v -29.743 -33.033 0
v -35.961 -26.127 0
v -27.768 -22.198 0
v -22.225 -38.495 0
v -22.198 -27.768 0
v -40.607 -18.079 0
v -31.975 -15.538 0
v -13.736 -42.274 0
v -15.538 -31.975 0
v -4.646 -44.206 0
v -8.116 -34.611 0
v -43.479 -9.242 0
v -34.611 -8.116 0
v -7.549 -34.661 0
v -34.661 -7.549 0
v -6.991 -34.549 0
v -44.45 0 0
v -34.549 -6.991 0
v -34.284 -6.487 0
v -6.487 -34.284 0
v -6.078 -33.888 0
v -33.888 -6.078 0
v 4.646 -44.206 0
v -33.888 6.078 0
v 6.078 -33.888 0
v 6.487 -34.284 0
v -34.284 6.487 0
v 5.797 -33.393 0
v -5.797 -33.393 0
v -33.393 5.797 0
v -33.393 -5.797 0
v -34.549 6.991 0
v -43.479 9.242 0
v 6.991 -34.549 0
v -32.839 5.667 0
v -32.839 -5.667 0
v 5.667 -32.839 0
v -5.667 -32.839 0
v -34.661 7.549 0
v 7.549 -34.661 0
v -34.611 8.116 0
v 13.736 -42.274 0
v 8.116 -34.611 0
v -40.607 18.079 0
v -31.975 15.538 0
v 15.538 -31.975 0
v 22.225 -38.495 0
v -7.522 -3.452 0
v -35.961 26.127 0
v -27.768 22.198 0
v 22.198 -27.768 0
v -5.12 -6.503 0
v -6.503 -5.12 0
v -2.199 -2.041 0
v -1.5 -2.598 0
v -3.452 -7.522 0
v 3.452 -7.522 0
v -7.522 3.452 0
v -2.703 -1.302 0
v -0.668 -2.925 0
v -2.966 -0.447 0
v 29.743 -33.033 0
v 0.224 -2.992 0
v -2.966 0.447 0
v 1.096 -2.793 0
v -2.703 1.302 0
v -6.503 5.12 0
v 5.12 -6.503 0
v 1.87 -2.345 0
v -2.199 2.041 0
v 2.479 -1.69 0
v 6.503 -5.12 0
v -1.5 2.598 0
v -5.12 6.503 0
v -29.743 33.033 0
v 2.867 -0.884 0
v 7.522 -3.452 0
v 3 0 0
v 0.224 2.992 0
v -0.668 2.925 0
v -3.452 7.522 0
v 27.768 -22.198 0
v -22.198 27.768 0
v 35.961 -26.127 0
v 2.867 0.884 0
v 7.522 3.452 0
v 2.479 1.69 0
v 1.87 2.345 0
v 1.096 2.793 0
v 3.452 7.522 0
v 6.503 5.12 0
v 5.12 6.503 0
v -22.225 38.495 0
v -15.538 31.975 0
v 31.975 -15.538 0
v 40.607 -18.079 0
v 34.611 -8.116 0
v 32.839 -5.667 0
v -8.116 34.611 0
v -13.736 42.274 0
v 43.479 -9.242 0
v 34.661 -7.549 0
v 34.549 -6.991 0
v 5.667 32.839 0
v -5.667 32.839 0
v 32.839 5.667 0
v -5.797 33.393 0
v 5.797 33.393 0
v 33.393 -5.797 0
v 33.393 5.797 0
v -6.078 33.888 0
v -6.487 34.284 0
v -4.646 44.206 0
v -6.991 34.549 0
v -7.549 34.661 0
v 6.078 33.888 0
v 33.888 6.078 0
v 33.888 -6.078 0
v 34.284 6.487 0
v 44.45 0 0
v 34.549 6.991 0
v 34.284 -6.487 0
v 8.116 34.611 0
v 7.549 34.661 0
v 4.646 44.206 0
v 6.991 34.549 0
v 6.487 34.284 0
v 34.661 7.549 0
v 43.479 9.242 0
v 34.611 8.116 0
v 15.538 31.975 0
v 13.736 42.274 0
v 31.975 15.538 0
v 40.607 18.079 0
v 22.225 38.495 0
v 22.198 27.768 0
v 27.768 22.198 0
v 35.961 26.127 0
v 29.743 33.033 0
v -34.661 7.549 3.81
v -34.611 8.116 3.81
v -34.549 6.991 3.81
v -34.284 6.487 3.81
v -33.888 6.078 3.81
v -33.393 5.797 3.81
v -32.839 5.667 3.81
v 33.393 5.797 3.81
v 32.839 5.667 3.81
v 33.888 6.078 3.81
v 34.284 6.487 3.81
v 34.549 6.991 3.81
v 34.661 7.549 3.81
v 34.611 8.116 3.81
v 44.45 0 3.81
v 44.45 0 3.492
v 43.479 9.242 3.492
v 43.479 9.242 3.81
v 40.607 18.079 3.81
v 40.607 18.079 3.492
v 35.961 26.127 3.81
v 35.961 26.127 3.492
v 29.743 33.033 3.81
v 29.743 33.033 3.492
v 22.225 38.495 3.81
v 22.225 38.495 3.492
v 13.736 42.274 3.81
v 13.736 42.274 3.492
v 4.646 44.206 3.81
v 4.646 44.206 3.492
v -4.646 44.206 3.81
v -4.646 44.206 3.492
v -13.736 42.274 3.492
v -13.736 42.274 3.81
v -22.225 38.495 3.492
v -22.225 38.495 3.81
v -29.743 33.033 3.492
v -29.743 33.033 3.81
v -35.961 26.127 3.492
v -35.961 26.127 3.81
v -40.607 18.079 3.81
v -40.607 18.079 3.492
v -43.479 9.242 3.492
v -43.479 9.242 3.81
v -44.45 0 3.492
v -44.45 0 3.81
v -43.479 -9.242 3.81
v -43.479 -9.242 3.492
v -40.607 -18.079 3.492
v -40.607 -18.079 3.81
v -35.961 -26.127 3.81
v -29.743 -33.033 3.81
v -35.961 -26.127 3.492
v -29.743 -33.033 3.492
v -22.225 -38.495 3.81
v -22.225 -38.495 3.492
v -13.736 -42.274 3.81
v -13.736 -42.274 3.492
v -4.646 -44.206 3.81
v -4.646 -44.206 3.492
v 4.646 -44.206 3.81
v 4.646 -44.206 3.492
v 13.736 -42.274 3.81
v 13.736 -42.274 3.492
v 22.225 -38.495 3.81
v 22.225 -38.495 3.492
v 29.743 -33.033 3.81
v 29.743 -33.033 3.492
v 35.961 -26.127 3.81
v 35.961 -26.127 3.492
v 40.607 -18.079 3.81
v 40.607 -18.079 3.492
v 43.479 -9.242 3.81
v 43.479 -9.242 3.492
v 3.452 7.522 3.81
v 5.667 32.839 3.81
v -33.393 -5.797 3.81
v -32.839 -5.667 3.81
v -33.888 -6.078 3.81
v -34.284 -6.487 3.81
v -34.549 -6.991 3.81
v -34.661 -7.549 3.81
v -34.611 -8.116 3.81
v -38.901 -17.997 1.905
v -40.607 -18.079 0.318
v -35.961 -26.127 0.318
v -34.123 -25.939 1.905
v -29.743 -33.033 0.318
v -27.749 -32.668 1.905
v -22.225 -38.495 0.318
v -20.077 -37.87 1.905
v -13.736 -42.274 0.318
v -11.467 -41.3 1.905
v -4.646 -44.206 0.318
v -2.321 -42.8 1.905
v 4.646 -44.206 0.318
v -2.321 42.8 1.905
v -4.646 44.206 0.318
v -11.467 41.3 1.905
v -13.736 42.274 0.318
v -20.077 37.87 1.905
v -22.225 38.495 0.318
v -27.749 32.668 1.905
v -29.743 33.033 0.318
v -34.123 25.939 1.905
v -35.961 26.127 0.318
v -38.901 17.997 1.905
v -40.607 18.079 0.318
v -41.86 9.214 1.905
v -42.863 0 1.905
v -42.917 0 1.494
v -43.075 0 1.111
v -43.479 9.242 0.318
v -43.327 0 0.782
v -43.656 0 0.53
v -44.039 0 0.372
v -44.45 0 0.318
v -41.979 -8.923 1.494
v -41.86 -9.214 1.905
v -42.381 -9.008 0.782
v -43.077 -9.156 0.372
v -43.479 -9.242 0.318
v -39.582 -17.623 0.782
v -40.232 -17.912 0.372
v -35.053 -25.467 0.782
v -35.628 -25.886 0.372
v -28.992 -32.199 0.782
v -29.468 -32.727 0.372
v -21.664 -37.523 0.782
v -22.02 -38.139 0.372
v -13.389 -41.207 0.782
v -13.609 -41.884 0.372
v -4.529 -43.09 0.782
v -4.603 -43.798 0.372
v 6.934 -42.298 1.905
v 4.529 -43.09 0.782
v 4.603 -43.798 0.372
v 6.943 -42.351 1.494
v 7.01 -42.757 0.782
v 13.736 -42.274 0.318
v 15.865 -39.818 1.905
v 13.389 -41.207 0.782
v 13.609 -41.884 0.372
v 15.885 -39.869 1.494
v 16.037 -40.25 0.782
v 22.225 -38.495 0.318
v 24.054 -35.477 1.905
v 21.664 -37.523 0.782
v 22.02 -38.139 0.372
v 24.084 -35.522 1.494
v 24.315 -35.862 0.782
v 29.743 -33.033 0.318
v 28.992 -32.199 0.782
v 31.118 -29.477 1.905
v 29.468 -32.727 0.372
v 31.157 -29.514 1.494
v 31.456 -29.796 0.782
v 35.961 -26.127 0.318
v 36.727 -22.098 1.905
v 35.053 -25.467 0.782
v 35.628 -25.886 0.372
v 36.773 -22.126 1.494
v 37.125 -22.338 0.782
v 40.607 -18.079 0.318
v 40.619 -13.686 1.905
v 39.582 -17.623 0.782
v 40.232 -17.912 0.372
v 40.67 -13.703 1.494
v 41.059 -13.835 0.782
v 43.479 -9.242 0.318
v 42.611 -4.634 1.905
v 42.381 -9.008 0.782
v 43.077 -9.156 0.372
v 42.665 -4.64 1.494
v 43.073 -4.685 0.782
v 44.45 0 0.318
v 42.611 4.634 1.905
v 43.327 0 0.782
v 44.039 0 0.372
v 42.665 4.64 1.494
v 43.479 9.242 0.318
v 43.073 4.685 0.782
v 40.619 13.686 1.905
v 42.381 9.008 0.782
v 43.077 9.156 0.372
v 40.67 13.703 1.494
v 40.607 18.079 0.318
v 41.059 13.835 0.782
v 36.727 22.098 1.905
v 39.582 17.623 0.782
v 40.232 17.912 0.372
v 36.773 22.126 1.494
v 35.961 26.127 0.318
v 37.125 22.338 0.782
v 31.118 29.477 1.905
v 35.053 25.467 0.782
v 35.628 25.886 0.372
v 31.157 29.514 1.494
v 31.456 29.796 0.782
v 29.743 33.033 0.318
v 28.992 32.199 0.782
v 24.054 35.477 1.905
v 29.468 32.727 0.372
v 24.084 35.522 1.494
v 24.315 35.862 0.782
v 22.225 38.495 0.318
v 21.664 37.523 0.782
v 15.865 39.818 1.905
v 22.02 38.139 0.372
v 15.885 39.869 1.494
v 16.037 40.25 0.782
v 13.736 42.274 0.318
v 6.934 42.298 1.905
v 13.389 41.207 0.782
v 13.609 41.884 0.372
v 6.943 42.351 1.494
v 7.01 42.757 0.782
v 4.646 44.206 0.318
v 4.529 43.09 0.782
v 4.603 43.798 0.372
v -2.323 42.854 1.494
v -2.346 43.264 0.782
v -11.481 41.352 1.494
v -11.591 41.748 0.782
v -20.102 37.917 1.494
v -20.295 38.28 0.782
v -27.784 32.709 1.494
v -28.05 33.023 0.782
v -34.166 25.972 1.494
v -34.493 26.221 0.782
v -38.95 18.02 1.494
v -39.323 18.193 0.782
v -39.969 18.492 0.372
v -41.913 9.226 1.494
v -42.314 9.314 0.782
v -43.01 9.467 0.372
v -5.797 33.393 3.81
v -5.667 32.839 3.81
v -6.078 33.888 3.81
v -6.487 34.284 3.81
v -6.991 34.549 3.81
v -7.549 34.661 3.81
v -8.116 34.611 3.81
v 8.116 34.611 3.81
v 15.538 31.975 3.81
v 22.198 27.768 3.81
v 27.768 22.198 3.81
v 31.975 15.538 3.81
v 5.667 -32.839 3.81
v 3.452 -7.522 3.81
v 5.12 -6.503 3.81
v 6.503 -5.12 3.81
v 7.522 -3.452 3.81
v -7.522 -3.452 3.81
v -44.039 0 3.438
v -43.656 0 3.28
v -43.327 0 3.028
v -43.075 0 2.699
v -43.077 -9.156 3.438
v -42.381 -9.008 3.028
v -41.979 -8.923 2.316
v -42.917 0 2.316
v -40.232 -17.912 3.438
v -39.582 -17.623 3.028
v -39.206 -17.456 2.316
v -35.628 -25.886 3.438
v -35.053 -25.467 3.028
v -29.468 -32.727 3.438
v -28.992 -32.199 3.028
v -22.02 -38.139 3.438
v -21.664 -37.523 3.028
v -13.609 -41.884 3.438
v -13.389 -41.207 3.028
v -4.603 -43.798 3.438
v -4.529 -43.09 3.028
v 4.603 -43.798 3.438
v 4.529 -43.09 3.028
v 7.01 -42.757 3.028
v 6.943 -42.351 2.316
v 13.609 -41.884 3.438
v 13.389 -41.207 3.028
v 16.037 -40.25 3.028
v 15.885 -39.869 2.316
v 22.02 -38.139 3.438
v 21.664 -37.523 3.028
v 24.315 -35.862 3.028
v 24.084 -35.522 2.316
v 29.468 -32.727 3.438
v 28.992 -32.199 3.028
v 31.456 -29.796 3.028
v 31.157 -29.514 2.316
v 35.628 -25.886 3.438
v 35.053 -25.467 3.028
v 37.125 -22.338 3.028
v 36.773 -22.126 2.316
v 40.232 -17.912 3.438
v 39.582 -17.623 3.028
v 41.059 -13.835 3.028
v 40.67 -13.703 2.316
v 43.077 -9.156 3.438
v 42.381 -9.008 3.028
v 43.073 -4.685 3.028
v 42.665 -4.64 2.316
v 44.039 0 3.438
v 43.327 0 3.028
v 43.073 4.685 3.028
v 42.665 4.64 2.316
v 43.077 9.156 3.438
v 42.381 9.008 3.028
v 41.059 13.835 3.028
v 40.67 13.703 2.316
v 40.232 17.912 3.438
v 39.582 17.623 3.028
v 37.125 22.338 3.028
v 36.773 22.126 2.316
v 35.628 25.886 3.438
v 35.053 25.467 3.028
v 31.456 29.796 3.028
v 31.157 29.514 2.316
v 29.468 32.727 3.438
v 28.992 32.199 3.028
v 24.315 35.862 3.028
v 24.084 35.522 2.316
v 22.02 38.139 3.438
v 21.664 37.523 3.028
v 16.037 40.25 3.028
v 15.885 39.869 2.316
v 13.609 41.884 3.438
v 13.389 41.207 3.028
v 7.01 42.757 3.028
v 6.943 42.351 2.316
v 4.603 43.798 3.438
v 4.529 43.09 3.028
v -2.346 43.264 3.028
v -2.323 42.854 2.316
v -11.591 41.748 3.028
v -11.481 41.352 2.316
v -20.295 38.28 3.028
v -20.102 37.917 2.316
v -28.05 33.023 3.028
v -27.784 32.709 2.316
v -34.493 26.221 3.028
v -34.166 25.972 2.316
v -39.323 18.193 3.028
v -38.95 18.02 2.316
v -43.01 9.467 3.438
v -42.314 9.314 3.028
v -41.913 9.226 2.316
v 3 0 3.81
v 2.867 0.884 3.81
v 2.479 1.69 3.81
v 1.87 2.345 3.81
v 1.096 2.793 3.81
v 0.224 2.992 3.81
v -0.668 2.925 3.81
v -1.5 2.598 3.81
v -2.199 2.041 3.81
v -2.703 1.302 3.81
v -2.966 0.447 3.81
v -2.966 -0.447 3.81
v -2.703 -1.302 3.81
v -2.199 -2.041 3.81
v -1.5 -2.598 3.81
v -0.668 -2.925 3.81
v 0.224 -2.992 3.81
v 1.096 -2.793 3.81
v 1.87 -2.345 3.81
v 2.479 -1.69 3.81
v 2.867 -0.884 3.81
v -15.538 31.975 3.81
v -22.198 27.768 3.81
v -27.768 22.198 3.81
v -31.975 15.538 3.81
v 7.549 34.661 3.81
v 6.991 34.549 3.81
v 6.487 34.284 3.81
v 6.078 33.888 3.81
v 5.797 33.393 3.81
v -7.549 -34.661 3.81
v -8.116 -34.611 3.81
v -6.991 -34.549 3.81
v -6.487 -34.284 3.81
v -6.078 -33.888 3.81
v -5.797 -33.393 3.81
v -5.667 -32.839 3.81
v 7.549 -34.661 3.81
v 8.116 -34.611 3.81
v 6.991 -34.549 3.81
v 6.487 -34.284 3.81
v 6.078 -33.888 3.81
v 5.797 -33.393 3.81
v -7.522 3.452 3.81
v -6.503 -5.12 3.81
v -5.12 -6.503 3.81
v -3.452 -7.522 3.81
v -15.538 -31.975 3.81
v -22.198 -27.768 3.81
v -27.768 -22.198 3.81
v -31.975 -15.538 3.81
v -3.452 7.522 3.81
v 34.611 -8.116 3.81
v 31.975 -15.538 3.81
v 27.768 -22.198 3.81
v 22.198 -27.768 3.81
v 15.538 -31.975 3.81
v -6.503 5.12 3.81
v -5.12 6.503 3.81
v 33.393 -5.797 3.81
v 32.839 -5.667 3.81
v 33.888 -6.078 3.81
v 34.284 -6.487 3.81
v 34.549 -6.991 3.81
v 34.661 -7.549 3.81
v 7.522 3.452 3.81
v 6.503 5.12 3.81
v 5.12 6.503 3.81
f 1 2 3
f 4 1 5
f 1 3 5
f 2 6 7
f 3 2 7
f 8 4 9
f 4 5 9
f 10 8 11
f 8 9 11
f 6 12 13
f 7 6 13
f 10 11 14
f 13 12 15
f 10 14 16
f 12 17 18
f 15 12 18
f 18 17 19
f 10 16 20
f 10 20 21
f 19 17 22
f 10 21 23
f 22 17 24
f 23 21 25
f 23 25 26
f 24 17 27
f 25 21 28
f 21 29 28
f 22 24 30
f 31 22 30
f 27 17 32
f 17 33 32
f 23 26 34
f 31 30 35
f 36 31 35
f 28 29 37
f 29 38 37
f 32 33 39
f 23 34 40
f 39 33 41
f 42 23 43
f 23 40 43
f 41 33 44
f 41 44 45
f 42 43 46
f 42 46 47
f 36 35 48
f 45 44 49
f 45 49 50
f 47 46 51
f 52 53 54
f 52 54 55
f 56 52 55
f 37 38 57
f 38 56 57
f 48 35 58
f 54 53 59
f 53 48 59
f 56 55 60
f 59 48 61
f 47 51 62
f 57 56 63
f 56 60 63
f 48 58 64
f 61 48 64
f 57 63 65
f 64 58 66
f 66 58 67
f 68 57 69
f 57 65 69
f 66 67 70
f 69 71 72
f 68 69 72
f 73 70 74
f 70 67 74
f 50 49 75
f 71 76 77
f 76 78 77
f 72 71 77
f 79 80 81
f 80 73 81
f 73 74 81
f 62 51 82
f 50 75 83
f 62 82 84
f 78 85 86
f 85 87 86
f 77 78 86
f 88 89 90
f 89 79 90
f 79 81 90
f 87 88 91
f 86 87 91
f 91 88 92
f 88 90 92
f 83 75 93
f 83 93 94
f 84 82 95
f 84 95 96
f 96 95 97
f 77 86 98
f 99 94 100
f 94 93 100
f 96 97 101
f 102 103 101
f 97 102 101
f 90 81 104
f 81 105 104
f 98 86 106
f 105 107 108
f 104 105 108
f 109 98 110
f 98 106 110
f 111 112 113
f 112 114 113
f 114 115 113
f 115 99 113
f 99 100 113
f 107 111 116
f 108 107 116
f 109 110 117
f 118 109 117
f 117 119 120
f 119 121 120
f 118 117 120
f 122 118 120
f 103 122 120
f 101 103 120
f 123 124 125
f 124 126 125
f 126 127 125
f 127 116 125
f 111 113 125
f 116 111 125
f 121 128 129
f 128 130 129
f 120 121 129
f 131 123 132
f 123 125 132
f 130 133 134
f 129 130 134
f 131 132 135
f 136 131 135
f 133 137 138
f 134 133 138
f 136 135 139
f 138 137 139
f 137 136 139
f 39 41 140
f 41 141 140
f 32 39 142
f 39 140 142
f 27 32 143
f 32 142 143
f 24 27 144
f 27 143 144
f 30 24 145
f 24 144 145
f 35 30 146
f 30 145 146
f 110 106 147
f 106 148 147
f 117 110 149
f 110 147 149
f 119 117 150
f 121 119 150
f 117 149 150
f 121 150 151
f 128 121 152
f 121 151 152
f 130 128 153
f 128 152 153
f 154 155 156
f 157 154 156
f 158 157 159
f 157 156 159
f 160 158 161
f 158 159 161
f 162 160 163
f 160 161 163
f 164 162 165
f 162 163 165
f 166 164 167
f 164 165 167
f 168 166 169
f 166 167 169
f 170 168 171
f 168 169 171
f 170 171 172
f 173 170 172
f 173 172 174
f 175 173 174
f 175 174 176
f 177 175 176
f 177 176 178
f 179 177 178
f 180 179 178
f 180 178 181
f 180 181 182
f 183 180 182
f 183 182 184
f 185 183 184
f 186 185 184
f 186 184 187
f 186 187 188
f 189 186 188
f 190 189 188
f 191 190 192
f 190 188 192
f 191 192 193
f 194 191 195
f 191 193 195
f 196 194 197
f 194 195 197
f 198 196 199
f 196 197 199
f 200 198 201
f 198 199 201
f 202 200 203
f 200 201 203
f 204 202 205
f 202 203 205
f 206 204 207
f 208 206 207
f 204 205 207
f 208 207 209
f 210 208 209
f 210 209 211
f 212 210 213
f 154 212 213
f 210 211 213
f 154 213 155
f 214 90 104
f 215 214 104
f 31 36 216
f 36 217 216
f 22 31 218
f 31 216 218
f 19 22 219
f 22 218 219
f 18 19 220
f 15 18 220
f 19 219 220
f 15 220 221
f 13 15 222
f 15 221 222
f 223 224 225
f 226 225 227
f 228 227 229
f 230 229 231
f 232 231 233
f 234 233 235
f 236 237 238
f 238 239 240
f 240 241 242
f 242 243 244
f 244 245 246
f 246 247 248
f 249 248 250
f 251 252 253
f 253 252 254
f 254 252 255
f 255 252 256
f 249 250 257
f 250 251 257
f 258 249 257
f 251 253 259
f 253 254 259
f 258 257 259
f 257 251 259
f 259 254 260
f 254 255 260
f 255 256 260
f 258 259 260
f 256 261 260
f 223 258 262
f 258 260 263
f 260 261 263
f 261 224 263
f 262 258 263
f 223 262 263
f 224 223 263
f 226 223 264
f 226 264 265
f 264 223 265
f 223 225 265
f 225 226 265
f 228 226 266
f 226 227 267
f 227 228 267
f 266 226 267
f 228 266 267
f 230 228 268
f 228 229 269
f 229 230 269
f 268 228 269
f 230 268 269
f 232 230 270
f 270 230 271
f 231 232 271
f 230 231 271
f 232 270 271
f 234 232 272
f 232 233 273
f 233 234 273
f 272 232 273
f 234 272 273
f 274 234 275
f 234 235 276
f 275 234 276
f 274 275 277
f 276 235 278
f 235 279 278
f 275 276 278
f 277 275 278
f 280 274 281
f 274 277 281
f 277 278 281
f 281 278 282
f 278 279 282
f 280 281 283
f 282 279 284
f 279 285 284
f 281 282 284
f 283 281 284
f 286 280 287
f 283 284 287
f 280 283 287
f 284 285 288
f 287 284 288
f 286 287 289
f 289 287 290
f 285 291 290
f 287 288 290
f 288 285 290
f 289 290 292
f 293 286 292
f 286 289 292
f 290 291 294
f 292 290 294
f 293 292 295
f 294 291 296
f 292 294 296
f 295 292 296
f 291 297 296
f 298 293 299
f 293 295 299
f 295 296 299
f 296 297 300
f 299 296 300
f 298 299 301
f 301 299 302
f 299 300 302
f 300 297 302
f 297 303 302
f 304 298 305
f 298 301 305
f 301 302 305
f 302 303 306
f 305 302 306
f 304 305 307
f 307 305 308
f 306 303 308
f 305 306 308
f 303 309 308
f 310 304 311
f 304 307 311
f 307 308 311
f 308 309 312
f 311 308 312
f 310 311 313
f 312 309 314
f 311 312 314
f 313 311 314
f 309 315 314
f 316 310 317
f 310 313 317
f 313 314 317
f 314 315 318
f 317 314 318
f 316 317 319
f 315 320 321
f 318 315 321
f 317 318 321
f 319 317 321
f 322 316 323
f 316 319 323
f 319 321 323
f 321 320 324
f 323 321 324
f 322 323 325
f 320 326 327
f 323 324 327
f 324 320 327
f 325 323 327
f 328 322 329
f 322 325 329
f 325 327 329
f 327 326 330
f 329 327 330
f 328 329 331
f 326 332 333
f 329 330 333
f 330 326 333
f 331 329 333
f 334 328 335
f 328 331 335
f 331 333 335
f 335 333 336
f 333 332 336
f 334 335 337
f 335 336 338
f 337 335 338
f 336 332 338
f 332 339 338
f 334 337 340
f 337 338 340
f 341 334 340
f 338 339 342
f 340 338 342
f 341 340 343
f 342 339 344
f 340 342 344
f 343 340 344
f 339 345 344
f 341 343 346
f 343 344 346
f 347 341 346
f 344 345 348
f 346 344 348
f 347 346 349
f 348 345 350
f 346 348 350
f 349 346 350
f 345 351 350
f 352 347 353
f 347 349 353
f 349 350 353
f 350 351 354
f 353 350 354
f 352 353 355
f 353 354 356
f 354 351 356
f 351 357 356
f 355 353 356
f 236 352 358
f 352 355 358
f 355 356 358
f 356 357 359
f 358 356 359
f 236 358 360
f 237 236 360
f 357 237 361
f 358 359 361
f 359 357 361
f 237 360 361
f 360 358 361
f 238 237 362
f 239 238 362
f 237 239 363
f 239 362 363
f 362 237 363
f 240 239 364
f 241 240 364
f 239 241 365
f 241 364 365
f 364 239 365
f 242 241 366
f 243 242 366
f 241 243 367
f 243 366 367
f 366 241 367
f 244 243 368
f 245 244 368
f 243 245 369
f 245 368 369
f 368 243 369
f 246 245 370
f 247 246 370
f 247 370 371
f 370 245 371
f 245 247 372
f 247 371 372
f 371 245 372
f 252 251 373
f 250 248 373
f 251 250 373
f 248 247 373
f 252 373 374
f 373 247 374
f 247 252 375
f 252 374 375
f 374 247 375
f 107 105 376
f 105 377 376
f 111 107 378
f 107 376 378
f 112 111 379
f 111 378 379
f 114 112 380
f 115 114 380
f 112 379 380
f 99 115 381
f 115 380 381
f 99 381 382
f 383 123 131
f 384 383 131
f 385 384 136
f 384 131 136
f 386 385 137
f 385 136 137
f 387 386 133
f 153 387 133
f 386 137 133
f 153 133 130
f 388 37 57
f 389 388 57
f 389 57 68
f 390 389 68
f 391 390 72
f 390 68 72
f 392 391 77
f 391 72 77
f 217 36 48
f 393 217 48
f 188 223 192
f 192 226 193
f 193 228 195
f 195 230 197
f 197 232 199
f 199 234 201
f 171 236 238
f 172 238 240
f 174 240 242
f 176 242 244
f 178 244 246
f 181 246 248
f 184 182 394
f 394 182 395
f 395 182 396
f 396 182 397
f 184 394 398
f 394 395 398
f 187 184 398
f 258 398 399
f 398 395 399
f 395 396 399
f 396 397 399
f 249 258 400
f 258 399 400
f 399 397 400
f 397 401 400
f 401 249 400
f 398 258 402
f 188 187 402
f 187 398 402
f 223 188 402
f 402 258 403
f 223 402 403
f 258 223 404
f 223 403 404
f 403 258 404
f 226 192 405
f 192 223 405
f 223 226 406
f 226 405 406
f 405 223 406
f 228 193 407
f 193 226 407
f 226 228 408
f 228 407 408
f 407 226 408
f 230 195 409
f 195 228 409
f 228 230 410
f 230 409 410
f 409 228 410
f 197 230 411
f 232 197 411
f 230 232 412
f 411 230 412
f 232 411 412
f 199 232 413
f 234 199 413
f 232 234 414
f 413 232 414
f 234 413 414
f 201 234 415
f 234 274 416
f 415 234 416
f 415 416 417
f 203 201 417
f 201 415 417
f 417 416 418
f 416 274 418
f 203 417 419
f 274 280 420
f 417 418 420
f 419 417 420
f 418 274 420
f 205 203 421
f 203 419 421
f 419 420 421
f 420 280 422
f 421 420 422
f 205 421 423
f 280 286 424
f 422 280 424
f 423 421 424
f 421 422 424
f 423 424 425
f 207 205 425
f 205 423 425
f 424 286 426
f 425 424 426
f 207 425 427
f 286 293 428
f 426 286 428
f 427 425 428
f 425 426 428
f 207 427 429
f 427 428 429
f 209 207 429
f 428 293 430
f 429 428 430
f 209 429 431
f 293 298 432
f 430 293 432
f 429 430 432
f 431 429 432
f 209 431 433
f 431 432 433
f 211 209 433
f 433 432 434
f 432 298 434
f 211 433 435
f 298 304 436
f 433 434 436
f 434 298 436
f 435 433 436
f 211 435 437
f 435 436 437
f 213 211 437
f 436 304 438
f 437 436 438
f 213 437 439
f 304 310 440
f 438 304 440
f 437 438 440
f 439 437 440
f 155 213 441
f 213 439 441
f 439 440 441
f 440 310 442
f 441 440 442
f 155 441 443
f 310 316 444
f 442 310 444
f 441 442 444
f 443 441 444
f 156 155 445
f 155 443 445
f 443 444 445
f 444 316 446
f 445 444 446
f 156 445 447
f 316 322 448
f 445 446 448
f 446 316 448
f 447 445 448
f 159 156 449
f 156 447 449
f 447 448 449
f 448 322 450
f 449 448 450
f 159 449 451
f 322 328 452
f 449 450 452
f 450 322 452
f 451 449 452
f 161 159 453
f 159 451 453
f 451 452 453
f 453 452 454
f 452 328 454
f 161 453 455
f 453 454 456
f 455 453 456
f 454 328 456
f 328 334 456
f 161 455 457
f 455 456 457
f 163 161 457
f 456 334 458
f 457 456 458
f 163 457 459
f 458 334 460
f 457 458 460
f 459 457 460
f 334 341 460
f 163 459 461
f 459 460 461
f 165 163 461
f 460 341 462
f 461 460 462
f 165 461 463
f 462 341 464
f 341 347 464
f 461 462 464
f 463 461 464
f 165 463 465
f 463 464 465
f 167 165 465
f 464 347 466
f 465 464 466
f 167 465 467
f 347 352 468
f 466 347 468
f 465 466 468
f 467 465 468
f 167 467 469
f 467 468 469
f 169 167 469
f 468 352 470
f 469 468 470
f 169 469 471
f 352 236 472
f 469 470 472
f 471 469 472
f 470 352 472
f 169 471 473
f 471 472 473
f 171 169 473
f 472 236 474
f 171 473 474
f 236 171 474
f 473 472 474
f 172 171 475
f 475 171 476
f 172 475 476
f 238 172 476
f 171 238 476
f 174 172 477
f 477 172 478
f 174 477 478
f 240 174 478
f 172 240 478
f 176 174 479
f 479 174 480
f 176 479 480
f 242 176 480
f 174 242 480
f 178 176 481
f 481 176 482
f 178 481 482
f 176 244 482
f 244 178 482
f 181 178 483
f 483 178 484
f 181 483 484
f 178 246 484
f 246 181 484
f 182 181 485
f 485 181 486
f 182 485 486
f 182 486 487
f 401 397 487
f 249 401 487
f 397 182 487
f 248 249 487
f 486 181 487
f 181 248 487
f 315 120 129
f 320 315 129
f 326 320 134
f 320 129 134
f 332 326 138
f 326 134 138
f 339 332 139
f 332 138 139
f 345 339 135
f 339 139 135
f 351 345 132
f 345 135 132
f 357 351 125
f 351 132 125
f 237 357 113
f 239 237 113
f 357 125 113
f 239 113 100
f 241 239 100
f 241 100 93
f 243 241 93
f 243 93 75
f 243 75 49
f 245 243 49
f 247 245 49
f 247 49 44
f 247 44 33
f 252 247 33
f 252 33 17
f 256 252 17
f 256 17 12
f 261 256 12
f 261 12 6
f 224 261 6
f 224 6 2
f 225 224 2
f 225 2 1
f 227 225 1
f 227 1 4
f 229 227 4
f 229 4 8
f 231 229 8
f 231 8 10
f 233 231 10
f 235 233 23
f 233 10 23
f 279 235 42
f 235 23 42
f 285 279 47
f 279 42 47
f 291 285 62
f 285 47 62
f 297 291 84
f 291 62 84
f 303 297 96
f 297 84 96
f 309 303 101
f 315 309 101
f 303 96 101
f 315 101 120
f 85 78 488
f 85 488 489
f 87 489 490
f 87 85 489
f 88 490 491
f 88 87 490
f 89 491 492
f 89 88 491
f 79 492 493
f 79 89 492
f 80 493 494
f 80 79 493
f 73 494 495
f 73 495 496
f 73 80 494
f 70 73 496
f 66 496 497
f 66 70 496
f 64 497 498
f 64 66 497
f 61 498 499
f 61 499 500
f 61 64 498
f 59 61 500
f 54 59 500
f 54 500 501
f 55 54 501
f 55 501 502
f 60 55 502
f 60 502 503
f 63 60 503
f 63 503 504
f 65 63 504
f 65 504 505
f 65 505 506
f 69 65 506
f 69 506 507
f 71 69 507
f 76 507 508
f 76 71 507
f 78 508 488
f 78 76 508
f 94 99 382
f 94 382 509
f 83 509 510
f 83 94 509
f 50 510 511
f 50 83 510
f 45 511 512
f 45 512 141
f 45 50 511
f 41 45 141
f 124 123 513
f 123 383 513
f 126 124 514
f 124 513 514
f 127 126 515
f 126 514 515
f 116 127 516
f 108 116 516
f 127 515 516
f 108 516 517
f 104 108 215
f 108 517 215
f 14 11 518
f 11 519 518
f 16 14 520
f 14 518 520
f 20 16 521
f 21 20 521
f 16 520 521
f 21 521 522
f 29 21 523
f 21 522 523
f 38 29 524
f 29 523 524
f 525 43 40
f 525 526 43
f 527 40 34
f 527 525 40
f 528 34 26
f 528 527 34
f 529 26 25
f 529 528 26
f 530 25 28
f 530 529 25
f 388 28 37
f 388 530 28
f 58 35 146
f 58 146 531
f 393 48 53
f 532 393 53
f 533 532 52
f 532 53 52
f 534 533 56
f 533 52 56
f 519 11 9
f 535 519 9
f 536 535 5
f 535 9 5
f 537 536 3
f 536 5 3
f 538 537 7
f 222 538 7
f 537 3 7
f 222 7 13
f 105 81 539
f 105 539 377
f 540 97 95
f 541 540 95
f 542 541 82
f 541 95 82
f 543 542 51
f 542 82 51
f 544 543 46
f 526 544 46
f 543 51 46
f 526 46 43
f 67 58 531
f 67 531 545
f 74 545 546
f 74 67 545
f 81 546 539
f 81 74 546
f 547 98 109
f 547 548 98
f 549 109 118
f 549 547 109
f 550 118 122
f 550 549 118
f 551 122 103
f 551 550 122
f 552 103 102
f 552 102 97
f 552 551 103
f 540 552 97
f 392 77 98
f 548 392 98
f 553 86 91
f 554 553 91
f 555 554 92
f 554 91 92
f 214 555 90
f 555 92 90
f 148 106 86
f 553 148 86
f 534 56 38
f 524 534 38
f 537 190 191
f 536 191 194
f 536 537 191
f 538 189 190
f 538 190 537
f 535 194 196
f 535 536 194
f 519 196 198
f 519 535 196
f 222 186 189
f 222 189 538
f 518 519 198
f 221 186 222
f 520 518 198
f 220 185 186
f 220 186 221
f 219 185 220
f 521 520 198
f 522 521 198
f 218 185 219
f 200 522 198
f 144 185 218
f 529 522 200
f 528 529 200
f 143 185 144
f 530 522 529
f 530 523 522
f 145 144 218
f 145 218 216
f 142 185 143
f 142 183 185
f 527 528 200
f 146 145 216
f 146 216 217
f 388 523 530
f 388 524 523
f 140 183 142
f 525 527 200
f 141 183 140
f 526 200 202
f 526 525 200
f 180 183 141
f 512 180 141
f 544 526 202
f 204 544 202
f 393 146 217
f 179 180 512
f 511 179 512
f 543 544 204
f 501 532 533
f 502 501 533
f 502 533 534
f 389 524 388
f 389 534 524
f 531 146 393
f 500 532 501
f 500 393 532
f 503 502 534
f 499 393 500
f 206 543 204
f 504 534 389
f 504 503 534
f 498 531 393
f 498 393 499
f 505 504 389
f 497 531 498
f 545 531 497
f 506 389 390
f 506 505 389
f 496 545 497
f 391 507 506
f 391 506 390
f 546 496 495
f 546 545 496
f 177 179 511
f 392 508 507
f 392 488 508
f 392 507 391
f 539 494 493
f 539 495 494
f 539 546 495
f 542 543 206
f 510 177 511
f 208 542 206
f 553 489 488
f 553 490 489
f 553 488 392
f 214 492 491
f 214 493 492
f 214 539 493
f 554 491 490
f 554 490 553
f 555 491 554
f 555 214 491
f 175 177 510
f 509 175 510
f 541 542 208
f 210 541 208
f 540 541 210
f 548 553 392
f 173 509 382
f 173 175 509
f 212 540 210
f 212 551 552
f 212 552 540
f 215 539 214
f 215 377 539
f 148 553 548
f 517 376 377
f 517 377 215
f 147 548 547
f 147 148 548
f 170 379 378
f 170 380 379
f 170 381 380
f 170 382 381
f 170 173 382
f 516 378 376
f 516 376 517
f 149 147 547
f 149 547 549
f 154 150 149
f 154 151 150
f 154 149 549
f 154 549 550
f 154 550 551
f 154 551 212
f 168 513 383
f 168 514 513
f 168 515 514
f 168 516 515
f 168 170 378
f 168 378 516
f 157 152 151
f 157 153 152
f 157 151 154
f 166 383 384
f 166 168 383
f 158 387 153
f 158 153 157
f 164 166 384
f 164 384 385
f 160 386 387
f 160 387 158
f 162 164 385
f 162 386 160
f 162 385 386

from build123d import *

# Parameters (mm, degrees)
SKETCH1_R           = 44.45
SKETCH1_R_2         = 3
BOSS_EXTRUDE1_DEPTH = 3.81
FILLET1_R           = 2
FILLET2_R           = 2
SKETCH3_R           = 1.5875


with BuildPart() as part:
    # Sketch1 → Boss-Extrude1 (new body)
    with BuildSketch(Plane.XY):
        Circle(SKETCH1_R)
        Circle(SKETCH1_R_2, mode=Mode.SUBTRACT)
        with BuildLine():
            Line((7.52236, -3.452121223), (35.063651683, -5.861672024))
            ThreePointArc((35.063651683, -5.861672024), (25.137808857, -25.137808857), (5.861672024, -35.063651683))
            Line((5.861672024, -35.063651683), (3.452121223, -7.52236))
            ThreePointArc((3.452121223, -7.52236), (5.852479855, -5.852479855), (7.52236, -3.452121223))
        make_face(mode=Mode.SUBTRACT)
        with BuildLine():
            Line((3.452121223, 7.52236), (5.861672024, 35.063651683))
            ThreePointArc((5.861672024, 35.063651683), (25.137808857, 25.137808857), (35.063651683, 5.861672024))
            Line((35.063651683, 5.861672024), (7.52236, 3.452121223))
            ThreePointArc((7.52236, 3.452121223), (5.852479855, 5.852479855), (3.452121223, 7.52236))
        make_face(mode=Mode.SUBTRACT)
        with BuildLine():
            Line((-3.452121223, 7.52236), (-5.861672024, 35.063651683))
            ThreePointArc((-5.861672024, 35.063651683), (-25.137808857, 25.137808857), (-35.063651683, 5.861672024))
            Line((-35.063651683, 5.861672024), (-7.52236, 3.452121223))
            ThreePointArc((-7.52236, 3.452121223), (-5.852479855, 5.852479855), (-3.452121223, 7.52236))
        make_face(mode=Mode.SUBTRACT)
        with BuildLine():
            Line((-3.452121223, -7.52236), (-5.861672024, -35.063651683))
            ThreePointArc((-5.861672024, -35.063651683), (-25.137808857, -25.137808857), (-35.063651683, -5.861672024))
            Line((-35.063651683, -5.861672024), (-7.52236, -3.452121223))
            ThreePointArc((-7.52236, -3.452121223), (-5.852479855, -5.852479855), (-3.452121223, -7.52236))
        make_face(mode=Mode.SUBTRACT)
    extrude(amount=BOSS_EXTRUDE1_DEPTH)

    # Fillet1
    fillet1_edges = [part.edges().sort_by_distance(p)[0] for p in [
        (35.063651683, -5.861672024, 1.905),
        (35.063651683, 5.861672024, 1.905),
    ]]
    fillet(fillet1_edges, radius=FILLET1_R)

    # Fillet2
    fillet2_edges = [part.edges().sort_by_distance(p)[0] for p in [
        (5.861672024, -35.063651683, 1.905),
        (-35.063651683, -5.861672024, 1.905),
        (-5.861672024, -35.063651683, 1.905),
        (5.861672024, 35.063651683, 1.905),
        (-5.861672024, 35.063651683, 1.905),
        (-35.063651683, 5.861672024, 1.905),
    ]]
    fillet(fillet2_edges, radius=FILLET2_R)

    # Sketch3 → Cut-Revolve1 (revolve, cut)
    with BuildSketch(Plane(origin=(0, 0, 0), x_dir=(1, 0, 0), z_dir=(0, 1, 0))):
        with Locations((-44.45, -1.905)):
            Circle(SKETCH3_R)
    revolve(axis=Axis((0, 0, 0), (0, 0, 1)), mode=Mode.SUBTRACT)


solid = part.part
